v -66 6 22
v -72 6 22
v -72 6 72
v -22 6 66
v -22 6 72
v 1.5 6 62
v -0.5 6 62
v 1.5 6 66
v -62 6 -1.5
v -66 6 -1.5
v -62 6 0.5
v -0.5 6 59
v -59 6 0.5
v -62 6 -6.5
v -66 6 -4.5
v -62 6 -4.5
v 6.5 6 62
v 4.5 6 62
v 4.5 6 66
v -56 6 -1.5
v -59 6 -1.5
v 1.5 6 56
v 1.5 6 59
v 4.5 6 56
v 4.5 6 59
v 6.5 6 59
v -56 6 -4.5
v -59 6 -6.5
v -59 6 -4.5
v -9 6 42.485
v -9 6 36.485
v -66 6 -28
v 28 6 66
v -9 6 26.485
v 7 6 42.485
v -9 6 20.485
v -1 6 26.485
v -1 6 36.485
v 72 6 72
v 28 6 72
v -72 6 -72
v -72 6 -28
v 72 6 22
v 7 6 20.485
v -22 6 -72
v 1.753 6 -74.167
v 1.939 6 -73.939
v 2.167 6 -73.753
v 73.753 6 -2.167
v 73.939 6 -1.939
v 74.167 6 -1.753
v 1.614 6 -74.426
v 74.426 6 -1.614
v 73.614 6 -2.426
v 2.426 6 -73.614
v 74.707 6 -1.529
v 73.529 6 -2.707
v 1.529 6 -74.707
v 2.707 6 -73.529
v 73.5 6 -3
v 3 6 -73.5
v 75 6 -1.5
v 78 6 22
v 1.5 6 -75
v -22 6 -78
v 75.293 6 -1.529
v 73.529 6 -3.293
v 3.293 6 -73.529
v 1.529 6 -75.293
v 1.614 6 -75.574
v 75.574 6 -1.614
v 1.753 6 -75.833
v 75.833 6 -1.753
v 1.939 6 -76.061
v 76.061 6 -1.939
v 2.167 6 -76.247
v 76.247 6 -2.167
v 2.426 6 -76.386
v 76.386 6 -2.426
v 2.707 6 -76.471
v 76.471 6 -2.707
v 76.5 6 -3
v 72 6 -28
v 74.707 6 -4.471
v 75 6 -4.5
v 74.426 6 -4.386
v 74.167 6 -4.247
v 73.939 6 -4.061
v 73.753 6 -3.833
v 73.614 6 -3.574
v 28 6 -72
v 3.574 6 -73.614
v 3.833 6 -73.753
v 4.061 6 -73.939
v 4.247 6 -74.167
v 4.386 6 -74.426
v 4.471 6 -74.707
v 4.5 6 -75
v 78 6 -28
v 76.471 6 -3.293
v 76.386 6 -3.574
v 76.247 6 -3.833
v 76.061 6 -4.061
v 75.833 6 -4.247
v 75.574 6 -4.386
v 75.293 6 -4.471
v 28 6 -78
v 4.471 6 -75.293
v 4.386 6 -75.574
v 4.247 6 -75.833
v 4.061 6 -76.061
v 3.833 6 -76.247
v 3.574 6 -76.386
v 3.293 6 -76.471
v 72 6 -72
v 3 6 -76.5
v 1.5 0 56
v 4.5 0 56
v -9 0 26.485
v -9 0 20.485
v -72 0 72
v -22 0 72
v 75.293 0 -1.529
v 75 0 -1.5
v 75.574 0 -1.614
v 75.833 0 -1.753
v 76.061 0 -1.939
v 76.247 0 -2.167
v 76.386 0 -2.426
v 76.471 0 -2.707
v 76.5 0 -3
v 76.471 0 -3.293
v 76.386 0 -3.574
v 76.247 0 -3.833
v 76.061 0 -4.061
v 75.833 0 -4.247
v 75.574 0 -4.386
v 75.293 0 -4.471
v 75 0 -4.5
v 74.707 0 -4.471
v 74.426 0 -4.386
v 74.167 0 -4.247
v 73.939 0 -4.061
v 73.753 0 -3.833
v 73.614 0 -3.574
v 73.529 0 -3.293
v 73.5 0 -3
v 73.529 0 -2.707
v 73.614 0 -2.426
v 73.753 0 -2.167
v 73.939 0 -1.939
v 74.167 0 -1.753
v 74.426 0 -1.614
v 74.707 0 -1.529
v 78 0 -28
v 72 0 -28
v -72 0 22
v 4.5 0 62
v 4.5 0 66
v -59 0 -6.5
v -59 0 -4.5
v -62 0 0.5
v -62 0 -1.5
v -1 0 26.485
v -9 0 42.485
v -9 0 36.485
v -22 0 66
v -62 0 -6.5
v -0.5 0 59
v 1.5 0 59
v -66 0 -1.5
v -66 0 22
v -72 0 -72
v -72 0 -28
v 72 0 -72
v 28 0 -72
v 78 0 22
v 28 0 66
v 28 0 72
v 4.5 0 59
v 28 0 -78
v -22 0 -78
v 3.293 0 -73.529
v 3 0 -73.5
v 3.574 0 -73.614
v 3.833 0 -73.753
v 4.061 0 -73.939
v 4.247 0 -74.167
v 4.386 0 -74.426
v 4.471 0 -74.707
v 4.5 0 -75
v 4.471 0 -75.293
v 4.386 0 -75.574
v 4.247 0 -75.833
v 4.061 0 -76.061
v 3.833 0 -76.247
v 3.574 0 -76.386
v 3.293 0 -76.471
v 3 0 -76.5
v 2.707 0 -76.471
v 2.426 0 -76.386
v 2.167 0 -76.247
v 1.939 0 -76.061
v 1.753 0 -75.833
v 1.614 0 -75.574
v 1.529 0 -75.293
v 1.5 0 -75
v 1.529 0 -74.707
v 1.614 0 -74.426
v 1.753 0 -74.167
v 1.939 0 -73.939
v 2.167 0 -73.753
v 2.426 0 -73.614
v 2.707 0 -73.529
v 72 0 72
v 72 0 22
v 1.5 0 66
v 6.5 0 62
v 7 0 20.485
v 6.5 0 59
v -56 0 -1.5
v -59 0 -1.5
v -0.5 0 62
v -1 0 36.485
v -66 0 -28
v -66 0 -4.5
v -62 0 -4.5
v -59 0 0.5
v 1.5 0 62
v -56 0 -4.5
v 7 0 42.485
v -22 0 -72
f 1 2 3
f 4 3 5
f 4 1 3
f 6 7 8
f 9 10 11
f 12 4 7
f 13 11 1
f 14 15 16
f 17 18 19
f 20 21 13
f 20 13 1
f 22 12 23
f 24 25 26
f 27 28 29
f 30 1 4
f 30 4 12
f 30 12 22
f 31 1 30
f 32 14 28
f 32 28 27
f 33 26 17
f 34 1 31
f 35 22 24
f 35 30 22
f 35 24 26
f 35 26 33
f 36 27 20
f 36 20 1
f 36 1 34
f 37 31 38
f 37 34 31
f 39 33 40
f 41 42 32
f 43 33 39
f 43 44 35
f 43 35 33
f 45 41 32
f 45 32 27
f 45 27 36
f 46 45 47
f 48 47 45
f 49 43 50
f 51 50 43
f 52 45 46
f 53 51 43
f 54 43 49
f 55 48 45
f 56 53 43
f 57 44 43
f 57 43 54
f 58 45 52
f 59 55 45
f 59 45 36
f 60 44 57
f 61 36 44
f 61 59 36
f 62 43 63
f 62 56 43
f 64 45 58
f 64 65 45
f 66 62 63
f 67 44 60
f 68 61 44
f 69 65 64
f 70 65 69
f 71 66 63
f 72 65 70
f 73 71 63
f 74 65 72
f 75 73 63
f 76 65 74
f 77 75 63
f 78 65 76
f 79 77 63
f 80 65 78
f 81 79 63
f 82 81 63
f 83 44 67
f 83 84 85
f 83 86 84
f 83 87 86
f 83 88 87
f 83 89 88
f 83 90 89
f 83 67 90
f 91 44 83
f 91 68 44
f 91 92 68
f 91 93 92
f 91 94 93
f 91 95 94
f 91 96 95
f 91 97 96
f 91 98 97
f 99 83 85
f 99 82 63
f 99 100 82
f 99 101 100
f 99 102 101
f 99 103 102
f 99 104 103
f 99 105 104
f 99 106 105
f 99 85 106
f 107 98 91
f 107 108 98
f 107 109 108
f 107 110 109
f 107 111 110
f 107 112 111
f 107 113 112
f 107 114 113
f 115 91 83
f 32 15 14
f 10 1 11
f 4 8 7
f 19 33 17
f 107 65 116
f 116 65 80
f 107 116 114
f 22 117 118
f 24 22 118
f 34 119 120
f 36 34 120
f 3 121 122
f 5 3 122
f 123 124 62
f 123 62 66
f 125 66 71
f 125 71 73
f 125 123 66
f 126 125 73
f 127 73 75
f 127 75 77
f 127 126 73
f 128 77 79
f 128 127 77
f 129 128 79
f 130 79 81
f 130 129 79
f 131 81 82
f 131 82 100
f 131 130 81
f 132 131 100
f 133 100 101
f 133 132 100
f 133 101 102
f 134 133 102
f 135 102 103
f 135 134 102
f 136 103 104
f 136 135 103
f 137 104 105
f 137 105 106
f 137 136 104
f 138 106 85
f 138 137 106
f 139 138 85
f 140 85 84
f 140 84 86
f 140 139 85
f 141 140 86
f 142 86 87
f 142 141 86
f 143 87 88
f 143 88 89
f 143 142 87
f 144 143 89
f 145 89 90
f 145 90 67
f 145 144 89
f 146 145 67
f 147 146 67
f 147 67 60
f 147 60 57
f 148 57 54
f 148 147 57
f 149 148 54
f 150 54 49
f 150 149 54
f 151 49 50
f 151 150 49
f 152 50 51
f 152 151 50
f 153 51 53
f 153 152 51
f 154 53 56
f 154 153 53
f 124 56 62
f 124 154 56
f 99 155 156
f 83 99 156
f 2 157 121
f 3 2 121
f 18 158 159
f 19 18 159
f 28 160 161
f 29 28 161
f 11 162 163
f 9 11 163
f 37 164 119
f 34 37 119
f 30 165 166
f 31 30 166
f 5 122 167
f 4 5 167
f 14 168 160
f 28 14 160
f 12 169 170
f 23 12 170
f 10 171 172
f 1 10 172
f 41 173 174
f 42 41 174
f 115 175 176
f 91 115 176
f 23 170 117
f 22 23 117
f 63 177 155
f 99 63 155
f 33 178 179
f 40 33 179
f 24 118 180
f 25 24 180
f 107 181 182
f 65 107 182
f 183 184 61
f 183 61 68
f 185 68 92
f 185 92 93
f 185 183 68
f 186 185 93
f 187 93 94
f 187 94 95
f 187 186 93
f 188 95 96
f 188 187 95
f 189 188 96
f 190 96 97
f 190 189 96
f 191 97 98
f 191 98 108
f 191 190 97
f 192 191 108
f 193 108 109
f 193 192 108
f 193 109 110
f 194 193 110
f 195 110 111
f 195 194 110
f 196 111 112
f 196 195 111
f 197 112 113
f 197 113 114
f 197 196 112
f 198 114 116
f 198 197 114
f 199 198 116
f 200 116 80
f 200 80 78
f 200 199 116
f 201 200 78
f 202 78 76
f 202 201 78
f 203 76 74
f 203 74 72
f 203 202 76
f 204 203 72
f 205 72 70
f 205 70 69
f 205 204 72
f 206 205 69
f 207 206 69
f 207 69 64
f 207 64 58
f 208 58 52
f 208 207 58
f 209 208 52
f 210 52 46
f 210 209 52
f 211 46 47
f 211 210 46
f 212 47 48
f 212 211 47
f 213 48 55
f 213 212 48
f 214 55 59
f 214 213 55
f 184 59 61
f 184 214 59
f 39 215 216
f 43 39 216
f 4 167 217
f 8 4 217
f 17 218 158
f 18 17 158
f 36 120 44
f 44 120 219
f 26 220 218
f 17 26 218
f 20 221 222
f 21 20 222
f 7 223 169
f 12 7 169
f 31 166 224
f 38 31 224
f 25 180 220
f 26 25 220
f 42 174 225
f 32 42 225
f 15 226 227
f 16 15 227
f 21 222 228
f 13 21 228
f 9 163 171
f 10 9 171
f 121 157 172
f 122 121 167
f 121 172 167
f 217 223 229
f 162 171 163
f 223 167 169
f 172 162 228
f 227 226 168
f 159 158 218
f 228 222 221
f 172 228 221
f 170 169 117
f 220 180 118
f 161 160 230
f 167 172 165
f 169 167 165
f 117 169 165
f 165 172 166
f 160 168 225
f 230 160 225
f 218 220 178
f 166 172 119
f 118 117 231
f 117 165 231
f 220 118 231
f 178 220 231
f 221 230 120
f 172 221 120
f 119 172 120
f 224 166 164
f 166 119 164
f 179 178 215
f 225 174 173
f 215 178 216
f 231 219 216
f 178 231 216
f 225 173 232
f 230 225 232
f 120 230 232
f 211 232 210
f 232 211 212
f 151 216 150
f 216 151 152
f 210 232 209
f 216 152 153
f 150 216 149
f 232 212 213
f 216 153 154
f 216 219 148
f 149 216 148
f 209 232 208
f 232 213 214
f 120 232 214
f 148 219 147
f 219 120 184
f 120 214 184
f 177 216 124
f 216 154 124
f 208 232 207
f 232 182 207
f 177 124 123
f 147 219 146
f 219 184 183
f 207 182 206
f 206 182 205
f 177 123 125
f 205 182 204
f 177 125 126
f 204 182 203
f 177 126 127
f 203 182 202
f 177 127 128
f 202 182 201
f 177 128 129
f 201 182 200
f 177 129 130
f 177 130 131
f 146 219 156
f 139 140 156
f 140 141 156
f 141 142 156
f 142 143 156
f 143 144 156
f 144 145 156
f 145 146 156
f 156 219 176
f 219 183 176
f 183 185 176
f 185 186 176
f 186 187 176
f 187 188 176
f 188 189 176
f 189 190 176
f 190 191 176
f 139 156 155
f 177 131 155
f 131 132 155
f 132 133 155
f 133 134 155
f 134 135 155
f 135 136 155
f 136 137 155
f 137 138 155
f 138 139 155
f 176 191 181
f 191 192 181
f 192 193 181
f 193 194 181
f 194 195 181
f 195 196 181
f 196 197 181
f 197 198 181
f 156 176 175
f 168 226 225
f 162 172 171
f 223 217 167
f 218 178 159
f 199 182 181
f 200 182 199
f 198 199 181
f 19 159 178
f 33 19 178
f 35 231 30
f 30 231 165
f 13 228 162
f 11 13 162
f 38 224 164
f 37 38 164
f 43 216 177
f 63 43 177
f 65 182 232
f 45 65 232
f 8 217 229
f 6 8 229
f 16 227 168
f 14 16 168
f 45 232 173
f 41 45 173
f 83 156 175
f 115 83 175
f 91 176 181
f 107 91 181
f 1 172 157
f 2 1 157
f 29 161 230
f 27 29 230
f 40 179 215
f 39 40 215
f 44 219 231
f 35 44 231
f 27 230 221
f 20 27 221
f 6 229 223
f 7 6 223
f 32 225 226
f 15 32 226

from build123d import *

# Parameters (mm, degrees)
SKETCH1_R           = 1.5
BOSS_EXTRUDE1_DEPTH = 6


with BuildPart() as part:
    # Sketch1 → Boss-Extrude1 (new body)
    with BuildSketch(Plane(origin=(0, 0, 0), x_dir=(1, 0, 0), z_dir=(0, 1, 0))):
        Polygon((-72, 72), (-72, 28), (-66, 28), (-66, 4.5), (-62, 4.5), (-62, 6.5), (-59, 6.5), (-59, 4.5), (-56, 4.5), (-56, 1.5), (-59, 1.5), (-59, -0.5), (-62, -0.5), (-62, 1.5), (-66, 1.5), (-66, -22), (-72, -22), (-72, -72), (-22, -72), (-22, -66), (1.5, -66), (1.5, -62), (-0.5, -62), (-0.5, -59), (1.5, -59), (1.5, -56), (4.5, -56), (4.5, -59), (6.5, -59), (6.5, -62), (4.5, -62), (4.5, -66), (28, -66), (28, -72), (72, -72), (72, -22), (78, -22), (78, 28), (72, 28), (72, 72), (28, 72), (28, 78), (-22, 78), (-22, 72), align=None)
        Polygon((-9, -20.484869039), (7, -20.484869039), (7, -42.484869039), (-9, -42.484869039), (-9, -36.484869039), (-1, -36.484869039), (-1, -26.484869039), (-9, -26.484869039), align=None, mode=Mode.SUBTRACT)
        with Locations(Location((3, 75, 0), (0, 0, 270))):
            Circle(SKETCH1_R, mode=Mode.SUBTRACT)
        with Locations(Location((75, 3, 0), (0, 0, 270))):
            Circle(SKETCH1_R, mode=Mode.SUBTRACT)
    extrude(amount=BOSS_EXTRUDE1_DEPTH)


solid = part.part
